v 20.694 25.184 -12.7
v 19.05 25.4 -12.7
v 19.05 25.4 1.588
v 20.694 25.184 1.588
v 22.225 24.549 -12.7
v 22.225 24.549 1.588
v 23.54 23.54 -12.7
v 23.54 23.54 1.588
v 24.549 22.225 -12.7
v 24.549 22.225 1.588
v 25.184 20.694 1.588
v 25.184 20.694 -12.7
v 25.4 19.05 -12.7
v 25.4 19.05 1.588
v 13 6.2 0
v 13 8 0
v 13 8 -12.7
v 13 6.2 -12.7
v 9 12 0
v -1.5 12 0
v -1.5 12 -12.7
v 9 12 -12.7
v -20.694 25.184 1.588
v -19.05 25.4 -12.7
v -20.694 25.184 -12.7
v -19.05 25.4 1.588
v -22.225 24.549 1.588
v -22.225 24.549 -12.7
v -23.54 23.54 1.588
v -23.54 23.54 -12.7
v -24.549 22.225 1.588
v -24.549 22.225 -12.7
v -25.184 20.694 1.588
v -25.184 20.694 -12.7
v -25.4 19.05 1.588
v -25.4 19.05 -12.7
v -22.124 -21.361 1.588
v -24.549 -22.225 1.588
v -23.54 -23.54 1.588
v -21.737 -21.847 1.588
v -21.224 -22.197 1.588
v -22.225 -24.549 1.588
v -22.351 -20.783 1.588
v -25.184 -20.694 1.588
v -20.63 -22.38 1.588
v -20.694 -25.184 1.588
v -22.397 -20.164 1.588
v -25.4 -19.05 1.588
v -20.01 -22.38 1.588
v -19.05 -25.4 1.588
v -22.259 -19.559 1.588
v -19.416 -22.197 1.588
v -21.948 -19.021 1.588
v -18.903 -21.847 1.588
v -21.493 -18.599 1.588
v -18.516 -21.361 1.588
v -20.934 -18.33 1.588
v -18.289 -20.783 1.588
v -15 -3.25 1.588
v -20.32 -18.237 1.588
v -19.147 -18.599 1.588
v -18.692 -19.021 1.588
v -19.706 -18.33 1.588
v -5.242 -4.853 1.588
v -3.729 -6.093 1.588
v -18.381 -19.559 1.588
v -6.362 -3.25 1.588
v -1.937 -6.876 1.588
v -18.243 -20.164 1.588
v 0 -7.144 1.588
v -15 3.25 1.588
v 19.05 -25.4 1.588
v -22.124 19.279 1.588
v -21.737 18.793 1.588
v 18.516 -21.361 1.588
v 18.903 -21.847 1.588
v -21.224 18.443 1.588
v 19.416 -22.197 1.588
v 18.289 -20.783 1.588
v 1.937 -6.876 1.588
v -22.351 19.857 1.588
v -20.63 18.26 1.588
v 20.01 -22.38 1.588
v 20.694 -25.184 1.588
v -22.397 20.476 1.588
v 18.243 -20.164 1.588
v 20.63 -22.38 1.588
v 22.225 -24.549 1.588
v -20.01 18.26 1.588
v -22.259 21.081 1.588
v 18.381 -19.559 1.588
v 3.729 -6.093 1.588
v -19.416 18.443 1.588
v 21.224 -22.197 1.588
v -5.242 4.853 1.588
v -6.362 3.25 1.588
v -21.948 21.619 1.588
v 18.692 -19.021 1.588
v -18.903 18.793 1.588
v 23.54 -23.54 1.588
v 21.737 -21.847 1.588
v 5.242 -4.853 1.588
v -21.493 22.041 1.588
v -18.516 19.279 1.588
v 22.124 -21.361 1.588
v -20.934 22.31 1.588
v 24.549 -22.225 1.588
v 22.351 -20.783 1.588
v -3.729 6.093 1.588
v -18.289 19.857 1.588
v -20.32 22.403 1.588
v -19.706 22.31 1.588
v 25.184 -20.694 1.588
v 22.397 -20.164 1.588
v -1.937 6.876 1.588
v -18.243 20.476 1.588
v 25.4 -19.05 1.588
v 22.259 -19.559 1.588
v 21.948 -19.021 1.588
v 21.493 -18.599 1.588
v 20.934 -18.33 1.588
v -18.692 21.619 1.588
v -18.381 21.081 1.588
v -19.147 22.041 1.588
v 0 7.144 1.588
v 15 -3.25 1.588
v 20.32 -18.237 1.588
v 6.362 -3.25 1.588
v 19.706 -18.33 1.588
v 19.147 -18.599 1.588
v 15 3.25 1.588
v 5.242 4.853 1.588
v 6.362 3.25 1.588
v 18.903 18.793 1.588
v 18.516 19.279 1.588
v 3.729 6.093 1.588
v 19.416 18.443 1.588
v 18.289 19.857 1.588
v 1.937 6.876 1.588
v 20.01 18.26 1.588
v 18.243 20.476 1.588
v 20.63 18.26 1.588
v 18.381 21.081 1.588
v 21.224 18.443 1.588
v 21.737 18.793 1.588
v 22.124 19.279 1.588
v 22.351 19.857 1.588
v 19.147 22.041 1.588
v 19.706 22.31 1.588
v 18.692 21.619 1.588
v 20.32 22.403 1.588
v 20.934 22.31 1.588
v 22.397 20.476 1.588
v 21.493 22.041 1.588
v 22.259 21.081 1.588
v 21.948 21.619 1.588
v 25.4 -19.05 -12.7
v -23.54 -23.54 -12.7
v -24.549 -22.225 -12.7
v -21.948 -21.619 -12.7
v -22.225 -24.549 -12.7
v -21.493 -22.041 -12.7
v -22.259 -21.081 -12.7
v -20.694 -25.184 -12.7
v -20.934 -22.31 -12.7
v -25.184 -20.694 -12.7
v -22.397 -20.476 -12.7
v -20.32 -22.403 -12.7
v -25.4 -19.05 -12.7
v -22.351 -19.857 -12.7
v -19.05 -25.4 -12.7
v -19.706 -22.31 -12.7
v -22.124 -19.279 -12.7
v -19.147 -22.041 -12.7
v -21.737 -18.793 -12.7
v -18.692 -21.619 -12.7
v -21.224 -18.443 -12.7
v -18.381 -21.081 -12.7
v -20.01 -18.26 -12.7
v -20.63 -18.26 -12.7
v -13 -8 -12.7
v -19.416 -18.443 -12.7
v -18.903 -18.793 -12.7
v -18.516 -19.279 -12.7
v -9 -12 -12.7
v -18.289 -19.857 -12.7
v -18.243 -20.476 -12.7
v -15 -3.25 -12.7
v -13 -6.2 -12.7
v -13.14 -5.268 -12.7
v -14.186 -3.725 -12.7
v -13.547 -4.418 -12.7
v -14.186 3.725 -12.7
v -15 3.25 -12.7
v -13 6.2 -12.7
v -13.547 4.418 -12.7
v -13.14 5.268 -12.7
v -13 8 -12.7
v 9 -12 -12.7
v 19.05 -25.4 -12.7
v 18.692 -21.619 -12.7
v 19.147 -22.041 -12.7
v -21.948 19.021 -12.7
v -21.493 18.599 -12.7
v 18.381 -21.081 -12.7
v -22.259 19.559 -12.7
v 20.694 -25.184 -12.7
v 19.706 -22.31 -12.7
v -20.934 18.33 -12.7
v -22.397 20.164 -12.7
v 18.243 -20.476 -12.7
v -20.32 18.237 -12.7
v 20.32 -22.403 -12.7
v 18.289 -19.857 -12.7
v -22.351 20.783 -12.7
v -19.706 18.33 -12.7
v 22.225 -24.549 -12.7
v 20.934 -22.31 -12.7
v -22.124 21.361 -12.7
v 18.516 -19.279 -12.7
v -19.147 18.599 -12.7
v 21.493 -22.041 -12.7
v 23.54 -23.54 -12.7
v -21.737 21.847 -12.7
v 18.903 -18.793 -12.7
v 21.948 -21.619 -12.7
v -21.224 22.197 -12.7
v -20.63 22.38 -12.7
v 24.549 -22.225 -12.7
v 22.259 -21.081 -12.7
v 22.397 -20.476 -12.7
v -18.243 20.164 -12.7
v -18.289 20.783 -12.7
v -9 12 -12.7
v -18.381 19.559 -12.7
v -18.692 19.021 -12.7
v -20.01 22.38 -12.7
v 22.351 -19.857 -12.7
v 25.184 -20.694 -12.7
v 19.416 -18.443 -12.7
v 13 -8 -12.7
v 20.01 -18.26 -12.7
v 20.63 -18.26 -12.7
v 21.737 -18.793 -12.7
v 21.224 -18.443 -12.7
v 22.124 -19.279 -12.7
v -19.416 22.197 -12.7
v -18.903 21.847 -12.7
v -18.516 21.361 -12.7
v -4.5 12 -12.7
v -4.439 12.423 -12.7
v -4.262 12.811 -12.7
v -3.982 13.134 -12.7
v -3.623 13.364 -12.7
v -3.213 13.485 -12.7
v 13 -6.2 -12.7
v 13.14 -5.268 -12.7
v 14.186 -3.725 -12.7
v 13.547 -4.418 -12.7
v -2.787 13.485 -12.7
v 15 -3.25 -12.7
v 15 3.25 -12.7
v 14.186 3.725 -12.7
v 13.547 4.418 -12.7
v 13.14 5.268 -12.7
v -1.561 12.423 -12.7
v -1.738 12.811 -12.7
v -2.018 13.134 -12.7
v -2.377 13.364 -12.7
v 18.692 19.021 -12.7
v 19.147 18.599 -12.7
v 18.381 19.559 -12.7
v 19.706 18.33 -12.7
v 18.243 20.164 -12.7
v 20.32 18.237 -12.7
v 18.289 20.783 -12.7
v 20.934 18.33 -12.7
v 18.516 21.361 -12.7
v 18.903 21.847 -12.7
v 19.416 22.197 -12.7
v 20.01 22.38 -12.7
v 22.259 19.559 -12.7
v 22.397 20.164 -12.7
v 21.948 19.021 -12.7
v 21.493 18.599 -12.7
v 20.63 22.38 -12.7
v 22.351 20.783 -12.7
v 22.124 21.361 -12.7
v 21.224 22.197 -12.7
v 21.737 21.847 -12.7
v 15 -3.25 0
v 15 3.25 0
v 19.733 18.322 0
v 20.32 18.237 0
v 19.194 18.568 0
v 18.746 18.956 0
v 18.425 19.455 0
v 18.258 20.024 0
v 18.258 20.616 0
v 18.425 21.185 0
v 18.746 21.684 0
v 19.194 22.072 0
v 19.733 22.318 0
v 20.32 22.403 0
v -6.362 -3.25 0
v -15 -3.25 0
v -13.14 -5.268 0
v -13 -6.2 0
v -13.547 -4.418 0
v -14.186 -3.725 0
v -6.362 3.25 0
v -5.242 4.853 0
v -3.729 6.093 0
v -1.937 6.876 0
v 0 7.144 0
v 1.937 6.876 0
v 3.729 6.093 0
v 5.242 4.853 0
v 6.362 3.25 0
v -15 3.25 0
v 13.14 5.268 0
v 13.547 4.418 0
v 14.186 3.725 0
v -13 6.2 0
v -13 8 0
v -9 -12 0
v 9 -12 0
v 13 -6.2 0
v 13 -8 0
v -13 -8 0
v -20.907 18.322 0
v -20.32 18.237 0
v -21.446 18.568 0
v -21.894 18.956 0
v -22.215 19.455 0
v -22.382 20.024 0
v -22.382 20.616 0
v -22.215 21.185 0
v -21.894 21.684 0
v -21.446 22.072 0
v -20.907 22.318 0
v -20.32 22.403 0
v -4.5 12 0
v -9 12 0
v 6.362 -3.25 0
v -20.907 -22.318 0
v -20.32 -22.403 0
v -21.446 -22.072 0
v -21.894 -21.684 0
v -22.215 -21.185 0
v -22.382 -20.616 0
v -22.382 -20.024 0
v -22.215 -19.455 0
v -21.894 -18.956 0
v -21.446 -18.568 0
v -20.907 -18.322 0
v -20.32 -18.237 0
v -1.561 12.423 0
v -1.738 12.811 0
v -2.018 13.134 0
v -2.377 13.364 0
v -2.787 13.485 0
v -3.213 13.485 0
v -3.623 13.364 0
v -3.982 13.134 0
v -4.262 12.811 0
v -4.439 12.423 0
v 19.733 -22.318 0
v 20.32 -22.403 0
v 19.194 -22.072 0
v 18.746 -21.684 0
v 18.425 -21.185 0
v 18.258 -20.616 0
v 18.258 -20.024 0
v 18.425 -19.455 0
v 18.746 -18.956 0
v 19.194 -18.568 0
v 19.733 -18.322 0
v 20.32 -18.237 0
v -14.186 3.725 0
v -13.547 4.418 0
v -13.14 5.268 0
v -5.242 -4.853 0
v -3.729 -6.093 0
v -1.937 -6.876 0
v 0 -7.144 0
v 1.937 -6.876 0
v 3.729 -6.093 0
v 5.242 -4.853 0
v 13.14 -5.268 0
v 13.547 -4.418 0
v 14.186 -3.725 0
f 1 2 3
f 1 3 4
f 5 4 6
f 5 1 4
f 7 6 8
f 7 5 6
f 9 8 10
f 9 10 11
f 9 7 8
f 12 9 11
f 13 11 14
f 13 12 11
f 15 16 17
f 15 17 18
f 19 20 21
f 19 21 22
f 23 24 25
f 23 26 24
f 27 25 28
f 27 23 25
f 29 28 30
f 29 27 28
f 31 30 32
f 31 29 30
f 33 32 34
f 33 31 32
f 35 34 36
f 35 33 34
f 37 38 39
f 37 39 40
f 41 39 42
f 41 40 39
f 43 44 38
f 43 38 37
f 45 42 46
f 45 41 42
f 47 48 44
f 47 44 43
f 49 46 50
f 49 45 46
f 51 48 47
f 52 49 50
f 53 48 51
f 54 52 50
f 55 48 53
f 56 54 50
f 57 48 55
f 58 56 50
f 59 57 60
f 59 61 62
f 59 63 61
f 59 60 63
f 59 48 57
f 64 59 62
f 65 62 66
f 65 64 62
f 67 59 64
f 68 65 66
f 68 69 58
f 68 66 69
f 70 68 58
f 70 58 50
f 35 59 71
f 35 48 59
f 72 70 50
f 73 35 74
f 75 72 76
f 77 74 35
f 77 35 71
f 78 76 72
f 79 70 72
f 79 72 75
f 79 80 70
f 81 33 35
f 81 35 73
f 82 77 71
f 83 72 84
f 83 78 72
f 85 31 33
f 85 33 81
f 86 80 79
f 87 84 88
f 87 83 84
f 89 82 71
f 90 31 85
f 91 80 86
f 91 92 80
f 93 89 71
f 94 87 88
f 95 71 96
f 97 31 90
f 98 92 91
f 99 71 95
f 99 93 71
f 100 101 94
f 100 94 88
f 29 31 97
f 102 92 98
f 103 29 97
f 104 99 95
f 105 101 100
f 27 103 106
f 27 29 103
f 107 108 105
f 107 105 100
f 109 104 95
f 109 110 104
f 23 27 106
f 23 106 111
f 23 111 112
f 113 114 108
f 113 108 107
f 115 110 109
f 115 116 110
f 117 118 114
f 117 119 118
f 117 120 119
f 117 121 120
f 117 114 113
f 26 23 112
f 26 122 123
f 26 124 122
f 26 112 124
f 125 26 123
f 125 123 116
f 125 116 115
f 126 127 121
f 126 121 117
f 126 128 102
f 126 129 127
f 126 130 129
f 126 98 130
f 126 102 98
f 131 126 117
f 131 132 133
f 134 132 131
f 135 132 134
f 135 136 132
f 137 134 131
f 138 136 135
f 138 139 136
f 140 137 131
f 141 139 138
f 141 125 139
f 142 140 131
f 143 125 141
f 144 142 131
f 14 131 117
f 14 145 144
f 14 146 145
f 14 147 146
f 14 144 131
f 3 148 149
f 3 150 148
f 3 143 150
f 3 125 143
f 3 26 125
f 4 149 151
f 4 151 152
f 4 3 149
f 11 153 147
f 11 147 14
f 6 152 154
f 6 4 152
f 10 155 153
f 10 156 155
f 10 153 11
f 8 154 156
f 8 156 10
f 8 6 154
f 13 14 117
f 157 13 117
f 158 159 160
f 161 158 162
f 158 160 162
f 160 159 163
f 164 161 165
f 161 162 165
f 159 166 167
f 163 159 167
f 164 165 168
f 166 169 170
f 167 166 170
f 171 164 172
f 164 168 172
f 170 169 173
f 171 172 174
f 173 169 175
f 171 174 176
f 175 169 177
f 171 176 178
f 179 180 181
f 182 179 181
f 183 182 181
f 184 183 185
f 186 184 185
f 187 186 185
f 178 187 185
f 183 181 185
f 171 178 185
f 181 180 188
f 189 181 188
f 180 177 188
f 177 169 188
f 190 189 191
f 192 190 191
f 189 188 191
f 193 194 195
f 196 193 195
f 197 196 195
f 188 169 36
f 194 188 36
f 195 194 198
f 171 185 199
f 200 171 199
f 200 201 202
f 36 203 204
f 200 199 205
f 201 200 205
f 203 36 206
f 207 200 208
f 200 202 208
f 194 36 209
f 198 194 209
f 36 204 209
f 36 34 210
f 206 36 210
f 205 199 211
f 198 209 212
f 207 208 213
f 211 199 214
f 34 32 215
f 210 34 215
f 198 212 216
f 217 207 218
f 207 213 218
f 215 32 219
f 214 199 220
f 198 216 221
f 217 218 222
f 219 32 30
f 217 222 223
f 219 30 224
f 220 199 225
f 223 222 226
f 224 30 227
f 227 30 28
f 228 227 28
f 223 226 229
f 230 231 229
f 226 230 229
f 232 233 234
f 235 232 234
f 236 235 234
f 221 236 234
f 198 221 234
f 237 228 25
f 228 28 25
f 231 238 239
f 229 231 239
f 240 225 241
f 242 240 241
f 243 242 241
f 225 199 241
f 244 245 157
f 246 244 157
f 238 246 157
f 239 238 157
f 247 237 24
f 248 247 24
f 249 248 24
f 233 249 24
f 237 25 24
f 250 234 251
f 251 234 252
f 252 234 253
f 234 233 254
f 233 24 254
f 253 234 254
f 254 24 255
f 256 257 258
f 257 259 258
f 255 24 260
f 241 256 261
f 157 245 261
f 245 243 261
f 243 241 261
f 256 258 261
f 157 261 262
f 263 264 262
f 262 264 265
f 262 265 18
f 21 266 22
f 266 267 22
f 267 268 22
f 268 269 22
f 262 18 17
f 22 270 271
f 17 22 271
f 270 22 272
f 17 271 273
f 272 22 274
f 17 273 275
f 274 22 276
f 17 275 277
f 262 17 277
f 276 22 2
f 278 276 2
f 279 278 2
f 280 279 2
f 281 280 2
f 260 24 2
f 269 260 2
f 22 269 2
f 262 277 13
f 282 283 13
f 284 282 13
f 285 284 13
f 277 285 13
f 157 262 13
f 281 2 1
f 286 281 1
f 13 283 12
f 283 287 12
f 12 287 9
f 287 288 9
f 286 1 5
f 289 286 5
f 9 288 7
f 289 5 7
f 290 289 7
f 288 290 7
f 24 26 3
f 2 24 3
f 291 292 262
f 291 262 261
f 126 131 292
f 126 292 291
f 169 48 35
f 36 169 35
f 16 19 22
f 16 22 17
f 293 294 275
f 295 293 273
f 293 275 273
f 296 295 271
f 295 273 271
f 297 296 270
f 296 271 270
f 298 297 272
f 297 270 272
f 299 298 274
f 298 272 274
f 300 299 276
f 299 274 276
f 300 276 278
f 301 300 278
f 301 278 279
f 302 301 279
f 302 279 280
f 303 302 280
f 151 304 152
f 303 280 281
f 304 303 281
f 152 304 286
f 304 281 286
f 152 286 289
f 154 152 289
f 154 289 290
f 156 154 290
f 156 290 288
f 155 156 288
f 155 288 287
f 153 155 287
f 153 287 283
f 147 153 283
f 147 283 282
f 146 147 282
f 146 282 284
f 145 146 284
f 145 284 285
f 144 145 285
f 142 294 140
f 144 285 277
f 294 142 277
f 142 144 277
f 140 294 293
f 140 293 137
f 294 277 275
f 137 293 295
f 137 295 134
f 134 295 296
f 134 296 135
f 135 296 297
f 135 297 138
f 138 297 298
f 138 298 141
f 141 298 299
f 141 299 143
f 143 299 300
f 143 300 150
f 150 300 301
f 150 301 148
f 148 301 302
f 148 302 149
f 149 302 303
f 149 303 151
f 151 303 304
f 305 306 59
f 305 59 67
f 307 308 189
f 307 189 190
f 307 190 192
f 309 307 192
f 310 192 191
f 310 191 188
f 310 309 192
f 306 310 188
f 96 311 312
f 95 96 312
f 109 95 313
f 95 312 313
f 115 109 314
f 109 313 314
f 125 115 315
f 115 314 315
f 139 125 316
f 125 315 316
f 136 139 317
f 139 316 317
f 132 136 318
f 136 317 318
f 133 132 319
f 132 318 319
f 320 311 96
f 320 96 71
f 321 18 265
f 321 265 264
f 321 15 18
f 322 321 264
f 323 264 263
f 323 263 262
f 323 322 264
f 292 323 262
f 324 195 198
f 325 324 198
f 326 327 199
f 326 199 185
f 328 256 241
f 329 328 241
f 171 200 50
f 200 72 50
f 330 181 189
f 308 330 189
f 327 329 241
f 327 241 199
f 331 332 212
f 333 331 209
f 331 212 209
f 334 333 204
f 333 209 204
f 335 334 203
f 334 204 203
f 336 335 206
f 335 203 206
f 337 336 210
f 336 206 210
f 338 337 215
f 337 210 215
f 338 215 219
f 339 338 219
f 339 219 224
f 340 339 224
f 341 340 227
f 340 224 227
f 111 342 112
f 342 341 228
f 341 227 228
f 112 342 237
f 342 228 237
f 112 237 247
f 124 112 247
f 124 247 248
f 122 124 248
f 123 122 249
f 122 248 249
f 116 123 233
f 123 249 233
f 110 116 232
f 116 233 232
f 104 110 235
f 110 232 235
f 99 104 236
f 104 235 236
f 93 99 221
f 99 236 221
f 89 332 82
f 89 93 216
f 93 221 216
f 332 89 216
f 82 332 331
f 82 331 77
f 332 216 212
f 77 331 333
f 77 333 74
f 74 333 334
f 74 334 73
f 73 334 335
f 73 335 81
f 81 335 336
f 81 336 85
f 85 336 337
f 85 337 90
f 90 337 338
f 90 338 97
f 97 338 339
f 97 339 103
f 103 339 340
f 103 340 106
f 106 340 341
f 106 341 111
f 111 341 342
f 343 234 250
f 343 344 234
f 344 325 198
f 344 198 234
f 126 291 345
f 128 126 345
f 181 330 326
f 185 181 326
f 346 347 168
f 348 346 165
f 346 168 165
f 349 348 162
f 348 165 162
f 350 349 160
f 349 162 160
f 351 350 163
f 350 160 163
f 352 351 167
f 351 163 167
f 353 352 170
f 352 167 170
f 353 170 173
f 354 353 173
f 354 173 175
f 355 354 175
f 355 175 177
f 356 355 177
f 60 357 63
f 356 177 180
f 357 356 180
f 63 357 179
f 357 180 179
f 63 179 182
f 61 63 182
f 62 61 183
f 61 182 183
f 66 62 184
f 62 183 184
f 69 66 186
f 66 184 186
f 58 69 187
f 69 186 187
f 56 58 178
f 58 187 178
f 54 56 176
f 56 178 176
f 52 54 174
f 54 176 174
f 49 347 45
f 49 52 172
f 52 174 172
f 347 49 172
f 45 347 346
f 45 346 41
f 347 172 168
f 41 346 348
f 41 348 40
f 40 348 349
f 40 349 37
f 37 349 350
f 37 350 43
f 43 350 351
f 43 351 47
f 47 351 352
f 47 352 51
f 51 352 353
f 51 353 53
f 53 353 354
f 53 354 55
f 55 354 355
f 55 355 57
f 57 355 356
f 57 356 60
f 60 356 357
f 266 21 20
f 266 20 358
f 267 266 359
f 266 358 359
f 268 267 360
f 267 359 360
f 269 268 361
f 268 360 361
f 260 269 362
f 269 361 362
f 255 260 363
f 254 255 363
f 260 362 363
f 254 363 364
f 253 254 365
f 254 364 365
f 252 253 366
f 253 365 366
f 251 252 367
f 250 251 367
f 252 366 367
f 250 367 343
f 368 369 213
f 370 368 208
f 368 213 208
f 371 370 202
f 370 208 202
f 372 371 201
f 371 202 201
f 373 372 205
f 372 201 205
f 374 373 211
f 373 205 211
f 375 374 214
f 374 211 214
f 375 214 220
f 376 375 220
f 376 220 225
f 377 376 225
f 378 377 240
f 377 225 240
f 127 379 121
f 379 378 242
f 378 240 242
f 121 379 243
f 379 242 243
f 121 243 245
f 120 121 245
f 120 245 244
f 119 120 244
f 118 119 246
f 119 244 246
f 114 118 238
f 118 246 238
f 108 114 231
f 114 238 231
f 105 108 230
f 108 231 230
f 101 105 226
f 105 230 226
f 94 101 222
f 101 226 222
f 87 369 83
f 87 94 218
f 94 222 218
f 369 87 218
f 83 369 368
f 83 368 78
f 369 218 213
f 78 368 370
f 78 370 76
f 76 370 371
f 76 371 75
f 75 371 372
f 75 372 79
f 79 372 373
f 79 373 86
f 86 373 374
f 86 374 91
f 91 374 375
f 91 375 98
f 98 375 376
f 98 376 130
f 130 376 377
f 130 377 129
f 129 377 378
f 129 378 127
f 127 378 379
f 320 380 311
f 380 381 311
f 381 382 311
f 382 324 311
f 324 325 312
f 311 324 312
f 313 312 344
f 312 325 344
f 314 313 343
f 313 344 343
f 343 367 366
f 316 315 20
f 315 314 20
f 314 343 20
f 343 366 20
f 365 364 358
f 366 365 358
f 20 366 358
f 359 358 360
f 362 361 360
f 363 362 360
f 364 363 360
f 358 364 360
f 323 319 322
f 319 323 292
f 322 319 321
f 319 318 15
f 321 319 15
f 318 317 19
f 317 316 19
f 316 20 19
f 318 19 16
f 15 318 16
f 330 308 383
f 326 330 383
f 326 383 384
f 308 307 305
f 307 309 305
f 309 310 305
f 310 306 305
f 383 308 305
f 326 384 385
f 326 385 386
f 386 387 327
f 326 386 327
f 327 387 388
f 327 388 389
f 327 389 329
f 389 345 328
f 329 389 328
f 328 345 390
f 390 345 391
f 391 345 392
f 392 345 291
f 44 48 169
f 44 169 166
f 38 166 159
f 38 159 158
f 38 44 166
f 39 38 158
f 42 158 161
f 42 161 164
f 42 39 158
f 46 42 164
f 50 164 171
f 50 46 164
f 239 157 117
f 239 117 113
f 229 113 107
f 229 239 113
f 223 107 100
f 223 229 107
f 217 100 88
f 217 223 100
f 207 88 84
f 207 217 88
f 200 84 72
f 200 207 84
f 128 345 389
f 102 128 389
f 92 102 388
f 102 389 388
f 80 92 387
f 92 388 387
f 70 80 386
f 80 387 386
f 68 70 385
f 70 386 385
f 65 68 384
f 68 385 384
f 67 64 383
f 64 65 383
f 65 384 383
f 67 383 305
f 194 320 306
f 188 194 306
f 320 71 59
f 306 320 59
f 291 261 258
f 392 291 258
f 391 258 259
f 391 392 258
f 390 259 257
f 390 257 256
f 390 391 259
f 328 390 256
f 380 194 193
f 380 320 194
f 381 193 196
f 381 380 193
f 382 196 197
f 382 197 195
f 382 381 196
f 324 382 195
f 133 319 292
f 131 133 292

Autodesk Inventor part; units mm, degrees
ref_plane "YZ Plane" through (0, 0, 0) normal (1, 0, 0) x (0, 1, 0)
ref_plane "XZ Plane" through (0, 0, 0) normal (0, 1, 0) x (-1, 0, 0)
ref_plane "XY Plane" through (0, 0, 0) normal (0, 0, 1) x (1, 0, 0)
sketch "Sketch1" plane through (0, 0, 0) normal (0, 0, 1) x (1, 0, 0)
  line L0 (-13, 12) -> (13, 12)
  line L1 (13, 12) -> (13, -12)
  line L2 (13, -12) -> (-13, -12)
  line L3 (-13, -12) -> (-13, 12)
  line L4 (-13, 3.25) -> (-15, 3.25)
  line L5 (-15, 3.25) -> (-15, -3.25)
  line L6 (-15, -3.25) -> (-13, -3.25)
  line L7 (-13, -3.25) -> (-13, 3.25)
  line L8 (13, 3.25) -> (15, 3.25)
  line L9 (15, 3.25) -> (15, -3.25)
  line L10 (15, -3.25) -> (13, -3.25)
  line L11 (13, -3.25) -> (13, 3.25)
  line L12 (-25.4, 25.4) -> (25.4, 25.4)
  line L13 (25.4, 25.4) -> (25.4, -25.4)
  line L14 (25.4, -25.4) -> (-25.4, -25.4)
  line L15 (-25.4, -25.4) -> (-25.4, 25.4)
  circle A0 centre (0, 0) radius 7.1437
  circle A1 centre (-3, 12) radius 1.5
  line L16 (-13, 8) -> (-9, 12)
  line L17 (9, 12) -> (13, 8)
  line L18 (13, -8) -> (9, -12)
  line L19 (-13, -8) -> (-9, -12)
  line L20 (-13, 3.25) -> (13, 3.25)
  line L21 (13, -3.25) -> (-13, -3.25)
  point P0 (-14, 3.25)
  point P1 (14, 3.25)
  point P2 (-14, -3.25)
  point P3 (14, -3.25)
  point P4 (-20.32, 20.32)
  point P5 (20.32, 20.32)
  point P6 (20.32, -20.32)
  point P7 (-20.32, -20.32)
  dimension "d0" = 24
  dimension "d1" = 12
  dimension "d2" = 26
  dimension "d3" = 13
  dimension "d4" = 2
  dimension "d5" = 6.5
  dimension "d6" = 3.25
  dimension "d7" = 2
  dimension "d8" = 14.2875
  dimension "d9" = 50.8
  dimension "d10" = 25.4
  dimension "d11" = 50.8
  dimension "d12" = 25.4
  dimension "d13" = 3
  dimension "d14" = 10
  dimension "d15" = 4
  dimension "d16" = 4
  dimension "d17" = 4
  dimension "d18" = 4
  dimension "d19" = 4
  dimension "d20" = 5.08
  dimension "d21" = 5.08
  dimension "d22" = 5.08
  dimension "d23" = 5.08
  dimension "d34" = 40.64
  dimension "d35" = 40.64
extrude "Extrusion1" add sketch "Sketch1" against normal blind 12.7 contours L0 L16 L3 | L0 L1 L17 | L19 L2 L3 | L18 L1 L2 | L12 L13 L14 L15
fillet "Fillet1" radius 3.175 4 edges at (-13, -3.25, -6.35) (-13, 3.25, -6.35) (13, 3.25, -6.35) (13, -3.25, -6.35)
extrude "Extrusion2" add sketch "Sketch1" along normal blind 1.5875 contours L0 L16 L3 | L0 A1 L17 L1 L20 A0 L3 L16 | A1 L0 | L0 A1 | L21 A0 L1 L18 L2 L19 L3 | L0 L1 L17 | L19 L2 L3 | L18 L1 L2 | L12 L13 L14 L15
hole "Hole1" at (-20.32, 20.32, 0) at (20.32, 20.32, 0) at (20.32, -20.32, 0) at (-20.32, -20.32, 0) direction (0, 0, -1) diameter 4.1656 end through all
thread "Thread1" size "10-32 UNF" class "2B" standard "ANSI Unified Screw Threads" full length
thread "Thread2" size "10-32 UNF" class "2B" standard "ANSI Unified Screw Threads" full length
thread "Thread3" size "10-32 UNF" class "2B" standard "ANSI Unified Screw Threads" full length
thread "Thread4" size "10-32 UNF" class "2B" standard "ANSI Unified Screw Threads" full length
hole "Hole2" at (20.32, 20.32, 0) at (-20.32, 20.32, 0) at (-20.32, -20.32, 0) at (20.32, -20.32, 0) direction (0, 0, 1) diameter 4.1656 end through all
fillet "Fillet2" radius 6.35 4 edges at (25.4, 25.4, -5.5563) (-25.4, 25.4, -5.5562) (-25.4, -25.4, -5.5562) (25.4, -25.4, -5.5563)
equation "\"d1\" = 0.5 * d0"
equation "\"d3\" = 0.5 * d2"
equation "\"d6\" = 0.5 * d5"
equation "\"d7\" = d4"
equation "\"d10\" = 0.5 * d9"
equation "\"d12\" = 0.5 * d11"
equation "\"d16\" = d15"
equation "\"d17\" = d15"
equation "\"d18\" = d15"
equation "\"d19\" = d15"
equation "\"d22\" = d21"
equation "\"d23\" = d21"
properties part number "BD gearbox mount block 2"
